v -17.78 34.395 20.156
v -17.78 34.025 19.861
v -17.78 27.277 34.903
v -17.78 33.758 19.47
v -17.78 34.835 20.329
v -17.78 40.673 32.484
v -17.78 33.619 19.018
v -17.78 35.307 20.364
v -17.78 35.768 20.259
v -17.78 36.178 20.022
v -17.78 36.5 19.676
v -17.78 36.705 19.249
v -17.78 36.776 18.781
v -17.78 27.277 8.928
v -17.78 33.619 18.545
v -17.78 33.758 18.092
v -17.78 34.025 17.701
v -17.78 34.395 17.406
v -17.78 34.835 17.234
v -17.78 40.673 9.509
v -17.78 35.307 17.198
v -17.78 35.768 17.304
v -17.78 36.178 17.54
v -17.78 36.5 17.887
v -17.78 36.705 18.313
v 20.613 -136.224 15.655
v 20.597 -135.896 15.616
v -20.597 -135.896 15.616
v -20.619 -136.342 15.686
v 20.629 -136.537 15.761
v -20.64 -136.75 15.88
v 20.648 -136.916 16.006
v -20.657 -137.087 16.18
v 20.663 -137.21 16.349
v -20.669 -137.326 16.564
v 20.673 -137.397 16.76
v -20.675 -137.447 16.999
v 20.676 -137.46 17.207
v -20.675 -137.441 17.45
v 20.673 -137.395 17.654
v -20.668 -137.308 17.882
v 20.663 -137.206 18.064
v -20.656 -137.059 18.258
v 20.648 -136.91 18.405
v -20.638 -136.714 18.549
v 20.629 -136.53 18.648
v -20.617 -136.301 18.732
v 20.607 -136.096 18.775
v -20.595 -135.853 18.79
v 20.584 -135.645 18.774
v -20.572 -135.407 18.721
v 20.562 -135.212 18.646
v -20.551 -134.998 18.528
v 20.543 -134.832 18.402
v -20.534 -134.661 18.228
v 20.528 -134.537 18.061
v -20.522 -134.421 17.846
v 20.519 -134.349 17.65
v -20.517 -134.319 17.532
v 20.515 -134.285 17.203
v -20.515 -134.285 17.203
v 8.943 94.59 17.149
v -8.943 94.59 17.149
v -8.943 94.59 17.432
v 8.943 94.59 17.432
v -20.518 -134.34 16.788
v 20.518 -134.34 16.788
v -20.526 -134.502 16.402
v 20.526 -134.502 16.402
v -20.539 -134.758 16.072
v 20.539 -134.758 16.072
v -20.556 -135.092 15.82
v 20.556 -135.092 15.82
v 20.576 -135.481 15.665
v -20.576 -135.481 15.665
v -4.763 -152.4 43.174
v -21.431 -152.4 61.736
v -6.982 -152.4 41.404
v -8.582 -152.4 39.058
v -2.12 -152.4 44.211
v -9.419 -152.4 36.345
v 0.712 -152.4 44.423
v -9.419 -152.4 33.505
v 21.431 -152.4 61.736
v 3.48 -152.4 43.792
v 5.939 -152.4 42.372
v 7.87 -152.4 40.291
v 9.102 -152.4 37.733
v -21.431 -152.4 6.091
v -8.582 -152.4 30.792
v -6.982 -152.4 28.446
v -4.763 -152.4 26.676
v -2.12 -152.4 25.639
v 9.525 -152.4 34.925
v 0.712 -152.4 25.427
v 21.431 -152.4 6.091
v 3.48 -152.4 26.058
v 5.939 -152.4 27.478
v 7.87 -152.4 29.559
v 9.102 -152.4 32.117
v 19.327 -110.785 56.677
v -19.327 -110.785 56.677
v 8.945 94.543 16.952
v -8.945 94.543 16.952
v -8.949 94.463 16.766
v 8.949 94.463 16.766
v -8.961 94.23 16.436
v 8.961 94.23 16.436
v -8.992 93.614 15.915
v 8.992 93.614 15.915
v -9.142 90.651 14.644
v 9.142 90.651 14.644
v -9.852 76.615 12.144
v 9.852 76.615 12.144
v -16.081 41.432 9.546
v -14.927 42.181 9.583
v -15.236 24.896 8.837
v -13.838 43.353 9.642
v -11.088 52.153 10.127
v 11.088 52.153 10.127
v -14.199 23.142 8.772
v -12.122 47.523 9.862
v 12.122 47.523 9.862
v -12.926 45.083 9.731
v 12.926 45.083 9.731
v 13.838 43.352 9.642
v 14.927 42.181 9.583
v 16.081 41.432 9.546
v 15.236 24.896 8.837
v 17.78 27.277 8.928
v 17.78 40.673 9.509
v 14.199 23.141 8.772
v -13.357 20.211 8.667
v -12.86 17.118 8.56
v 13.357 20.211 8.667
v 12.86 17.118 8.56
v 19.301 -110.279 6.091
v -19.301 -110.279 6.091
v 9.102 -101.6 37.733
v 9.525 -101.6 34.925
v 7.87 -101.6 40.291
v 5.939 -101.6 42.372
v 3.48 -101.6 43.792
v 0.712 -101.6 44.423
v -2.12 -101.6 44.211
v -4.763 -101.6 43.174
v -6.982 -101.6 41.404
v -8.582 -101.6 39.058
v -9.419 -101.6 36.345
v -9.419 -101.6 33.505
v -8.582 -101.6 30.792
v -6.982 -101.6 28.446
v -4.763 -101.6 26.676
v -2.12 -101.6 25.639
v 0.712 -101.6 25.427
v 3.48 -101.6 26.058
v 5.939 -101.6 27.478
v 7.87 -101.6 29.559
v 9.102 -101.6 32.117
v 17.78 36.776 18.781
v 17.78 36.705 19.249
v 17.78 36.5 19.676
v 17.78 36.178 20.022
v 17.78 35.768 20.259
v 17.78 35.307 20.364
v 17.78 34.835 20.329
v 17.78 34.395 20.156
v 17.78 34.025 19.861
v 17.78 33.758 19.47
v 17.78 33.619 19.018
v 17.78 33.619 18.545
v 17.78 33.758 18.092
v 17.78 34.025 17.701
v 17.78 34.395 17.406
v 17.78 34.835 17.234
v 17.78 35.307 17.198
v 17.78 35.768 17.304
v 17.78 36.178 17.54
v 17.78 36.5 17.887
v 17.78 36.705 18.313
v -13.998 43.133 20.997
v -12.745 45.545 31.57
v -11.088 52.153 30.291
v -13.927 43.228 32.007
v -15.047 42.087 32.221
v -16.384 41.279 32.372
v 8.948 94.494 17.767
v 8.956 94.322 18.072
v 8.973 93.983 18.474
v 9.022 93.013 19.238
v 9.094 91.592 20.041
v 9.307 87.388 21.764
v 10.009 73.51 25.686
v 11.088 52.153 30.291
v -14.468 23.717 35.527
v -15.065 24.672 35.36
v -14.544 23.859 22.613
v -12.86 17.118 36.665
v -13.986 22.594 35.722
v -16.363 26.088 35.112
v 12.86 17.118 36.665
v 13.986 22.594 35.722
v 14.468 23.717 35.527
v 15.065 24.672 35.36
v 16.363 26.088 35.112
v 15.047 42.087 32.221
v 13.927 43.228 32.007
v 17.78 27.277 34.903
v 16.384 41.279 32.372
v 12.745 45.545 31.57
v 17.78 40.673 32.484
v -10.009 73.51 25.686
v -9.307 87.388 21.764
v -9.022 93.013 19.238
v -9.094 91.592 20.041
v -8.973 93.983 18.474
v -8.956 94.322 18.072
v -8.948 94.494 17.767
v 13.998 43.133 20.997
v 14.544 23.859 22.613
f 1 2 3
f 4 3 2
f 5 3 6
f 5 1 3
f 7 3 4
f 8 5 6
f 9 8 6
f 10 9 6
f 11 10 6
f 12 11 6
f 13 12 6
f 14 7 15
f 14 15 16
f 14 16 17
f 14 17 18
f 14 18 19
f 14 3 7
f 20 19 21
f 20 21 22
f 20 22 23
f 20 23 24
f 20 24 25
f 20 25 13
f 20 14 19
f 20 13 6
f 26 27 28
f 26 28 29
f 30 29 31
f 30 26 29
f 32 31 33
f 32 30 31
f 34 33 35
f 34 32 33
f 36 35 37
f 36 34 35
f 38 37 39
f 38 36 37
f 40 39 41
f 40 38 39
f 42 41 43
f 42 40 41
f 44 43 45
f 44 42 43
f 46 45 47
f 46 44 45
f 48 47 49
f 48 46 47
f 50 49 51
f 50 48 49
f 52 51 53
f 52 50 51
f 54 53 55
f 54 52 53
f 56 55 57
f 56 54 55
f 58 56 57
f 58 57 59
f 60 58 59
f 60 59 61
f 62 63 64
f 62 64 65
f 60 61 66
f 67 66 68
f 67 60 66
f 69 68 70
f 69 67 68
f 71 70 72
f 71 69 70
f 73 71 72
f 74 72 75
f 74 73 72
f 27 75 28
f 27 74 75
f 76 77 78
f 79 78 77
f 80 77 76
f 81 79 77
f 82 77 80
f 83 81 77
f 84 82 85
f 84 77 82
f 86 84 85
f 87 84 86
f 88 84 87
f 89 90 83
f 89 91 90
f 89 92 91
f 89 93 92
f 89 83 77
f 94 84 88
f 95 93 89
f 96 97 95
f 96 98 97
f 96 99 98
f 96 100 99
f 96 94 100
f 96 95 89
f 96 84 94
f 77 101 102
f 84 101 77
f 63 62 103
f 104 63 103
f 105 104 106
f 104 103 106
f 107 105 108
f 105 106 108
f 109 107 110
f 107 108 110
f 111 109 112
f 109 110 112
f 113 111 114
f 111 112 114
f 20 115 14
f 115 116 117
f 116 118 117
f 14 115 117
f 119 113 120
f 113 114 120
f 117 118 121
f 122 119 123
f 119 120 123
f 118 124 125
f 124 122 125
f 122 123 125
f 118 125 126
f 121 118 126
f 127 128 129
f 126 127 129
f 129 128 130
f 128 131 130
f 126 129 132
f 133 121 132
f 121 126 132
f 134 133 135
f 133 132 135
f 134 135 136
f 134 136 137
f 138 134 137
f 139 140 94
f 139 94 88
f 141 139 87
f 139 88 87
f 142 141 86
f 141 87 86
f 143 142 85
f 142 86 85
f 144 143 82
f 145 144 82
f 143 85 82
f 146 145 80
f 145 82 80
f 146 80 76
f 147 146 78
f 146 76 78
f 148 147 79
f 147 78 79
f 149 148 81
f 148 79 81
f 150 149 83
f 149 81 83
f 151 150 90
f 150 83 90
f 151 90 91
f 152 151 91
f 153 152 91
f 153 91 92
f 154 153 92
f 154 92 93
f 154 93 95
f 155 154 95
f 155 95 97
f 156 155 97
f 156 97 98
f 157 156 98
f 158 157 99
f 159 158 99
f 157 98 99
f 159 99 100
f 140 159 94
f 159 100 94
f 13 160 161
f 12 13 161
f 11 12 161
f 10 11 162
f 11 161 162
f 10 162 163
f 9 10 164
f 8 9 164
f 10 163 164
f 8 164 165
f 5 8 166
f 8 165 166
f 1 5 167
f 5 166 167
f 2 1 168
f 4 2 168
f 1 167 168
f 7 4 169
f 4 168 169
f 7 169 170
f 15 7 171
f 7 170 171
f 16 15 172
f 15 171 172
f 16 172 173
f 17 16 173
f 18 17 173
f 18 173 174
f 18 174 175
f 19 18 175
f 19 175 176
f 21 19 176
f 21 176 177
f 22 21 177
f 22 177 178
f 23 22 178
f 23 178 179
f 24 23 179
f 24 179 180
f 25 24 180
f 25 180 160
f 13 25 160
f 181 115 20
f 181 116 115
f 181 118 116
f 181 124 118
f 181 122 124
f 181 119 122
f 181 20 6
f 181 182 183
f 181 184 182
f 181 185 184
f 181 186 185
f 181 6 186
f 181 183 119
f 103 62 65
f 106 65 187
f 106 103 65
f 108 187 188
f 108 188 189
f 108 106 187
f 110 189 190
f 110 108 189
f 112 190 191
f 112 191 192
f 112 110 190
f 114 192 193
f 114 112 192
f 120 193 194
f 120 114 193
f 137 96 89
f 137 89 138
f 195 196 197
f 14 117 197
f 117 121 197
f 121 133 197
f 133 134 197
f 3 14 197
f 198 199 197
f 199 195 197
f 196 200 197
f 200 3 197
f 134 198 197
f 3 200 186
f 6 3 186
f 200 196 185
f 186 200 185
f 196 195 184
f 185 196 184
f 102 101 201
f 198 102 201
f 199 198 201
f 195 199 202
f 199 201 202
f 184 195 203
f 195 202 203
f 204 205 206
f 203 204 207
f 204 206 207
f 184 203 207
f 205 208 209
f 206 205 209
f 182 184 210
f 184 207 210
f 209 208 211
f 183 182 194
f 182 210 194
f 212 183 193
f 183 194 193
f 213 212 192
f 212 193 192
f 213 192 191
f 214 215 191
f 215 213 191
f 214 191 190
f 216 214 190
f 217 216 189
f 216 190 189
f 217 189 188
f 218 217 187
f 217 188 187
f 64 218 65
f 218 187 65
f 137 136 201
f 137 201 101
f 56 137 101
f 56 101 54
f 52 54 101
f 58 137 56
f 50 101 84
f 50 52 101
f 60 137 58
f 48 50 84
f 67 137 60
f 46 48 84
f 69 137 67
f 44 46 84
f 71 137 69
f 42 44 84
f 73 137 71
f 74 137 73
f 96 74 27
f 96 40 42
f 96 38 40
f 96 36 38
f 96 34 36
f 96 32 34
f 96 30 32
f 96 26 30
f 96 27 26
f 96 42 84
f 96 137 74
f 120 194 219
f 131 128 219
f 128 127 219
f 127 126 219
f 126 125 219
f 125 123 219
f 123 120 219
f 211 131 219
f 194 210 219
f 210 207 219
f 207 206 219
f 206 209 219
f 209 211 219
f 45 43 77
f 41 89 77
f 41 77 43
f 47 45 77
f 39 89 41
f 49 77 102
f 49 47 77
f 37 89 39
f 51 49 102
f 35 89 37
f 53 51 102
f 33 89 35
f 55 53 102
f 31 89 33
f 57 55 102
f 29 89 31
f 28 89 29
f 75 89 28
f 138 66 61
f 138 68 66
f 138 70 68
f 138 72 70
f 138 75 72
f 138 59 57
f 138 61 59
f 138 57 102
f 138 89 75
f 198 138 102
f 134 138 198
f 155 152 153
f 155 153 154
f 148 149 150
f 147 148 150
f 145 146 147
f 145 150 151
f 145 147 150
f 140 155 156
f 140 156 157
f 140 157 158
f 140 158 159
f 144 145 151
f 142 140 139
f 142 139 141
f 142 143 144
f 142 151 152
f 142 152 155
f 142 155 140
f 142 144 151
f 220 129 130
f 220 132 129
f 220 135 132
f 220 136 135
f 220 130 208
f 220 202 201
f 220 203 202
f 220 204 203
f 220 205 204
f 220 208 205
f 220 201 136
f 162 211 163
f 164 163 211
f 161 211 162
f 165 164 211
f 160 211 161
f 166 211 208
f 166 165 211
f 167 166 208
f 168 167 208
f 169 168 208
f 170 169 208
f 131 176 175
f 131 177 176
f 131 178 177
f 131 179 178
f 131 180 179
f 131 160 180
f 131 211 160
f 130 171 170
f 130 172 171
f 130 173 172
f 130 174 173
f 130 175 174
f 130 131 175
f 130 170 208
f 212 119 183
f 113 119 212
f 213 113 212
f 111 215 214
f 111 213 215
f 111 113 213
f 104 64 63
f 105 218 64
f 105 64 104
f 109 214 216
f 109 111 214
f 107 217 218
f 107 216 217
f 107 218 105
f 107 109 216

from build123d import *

# Parameters (mm, degrees)
F1_DEPTH = 21.43125
F2_R     = 9.525
F3_DEPTH = 50.8
F4_R     = 1.5875
F6_DEPTH = 42.8635
F7_DEPTH = 61.7368760046


with BuildPart() as f1:
    # F0 (on Right) → F1 (new body, symmetric)
    with BuildSketch(Plane.YZ):
        Polygon((-152.4, 69.85), (-152.4, 0), (152.4, 0), (152.4, 19.05), align=None)
    extrude(amount=F1_DEPTH, both=True)

    # F2 (on face) → F3 (cut)
    with BuildSketch(Plane.XZ.offset(152.4)):
        with Locations((0, 34.925)):
            Circle(F2_R)
    extrude(amount=-F3_DEPTH, mode=Mode.SUBTRACT)

    # F4 (on face) → F6 (intersect, through all)
    with BuildSketch(Plane.YZ.offset(21.43125)):
        with BuildLine():
            add(Edge.make_bspline(
                [(-110.784560442, 56.6772185266), (-7.8078894531, 41.1616744021), (197.1659329213, 10.2781708389), (-8.1241632402, 7.4820430193), (-110.2786958218, 6.0906601138)],
                knots=[0, 0, 0, 0, 0.5023893773, 1, 1, 1, 1], degree=3))
            Line((-110.784560442, 56.6772185266), (-152.4, 61.7358759046))
            Line((-152.4, 61.7358759046), (-152.4, 6.0906601138))
            Line((-152.4, 6.0906601138), (-135.8959368267, 6.0906601138))
            Line((-135.8959368267, 6.0906601138), (-110.2786958218, 6.0906601138))
        make_face()
        with BuildLine():
            ThreePointArc((-134.2849996434, 17.202987096), (-134.7582847356, 16.0721991454), (-135.8959368267, 15.6156601138))
            ThreePointArc((-135.8959368267, 15.6156601138), (-136.9867145512, 18.3337750467), (-134.2849996434, 17.202987096))
        make_face(mode=Mode.SUBTRACT)
        with Locations((35.1882949471, 18.7812717256)):
            Circle(F4_R, mode=Mode.SUBTRACT)
    extrude(amount=-F6_DEPTH, mode=Mode.INTERSECT)

    # F5 (on face) → F7 (intersect, through all)
    with BuildSketch(Plane(origin=(0, 0, 0), x_dir=(1, 0, 0), z_dir=(0, 0, -1))):
        with BuildLine():
            Line((21.43125, 152.4), (-21.43125, 152.4))
            Line((-21.43125, 152.4), (-12.8599264801, -17.1176383792))
            add(Edge.make_bspline(
                [(-17.78, -27.2766537964), (-16.5623446124, -26.2978531998), (-13.865051172, -24.1296597555), (-13.2159822939, -19.6015799215), (-12.8599264801, -17.1176383792)],
                knots=[0, 0, 0, 0, 0.4514360097, 1, 1, 1, 1], degree=3))
            Line((-17.78, -27.2766537964), (-17.78, -40.6726039946))
            add(Edge.make_bspline(
                [(-17.78, -40.6726039946), (-16.3984452114, -41.2366877132), (-13.0146417293, -42.6182821799), (-11.8044986652, -48.6084287427), (-11.0884383555, -52.1528908229)],
                knots=[0, 0, 0, 0, 0.4082845815, 1, 1, 1, 1], degree=3))
            Line((-11.0884383555, -52.1528908229), (-8.9427102357, -94.5896))
            Line((-8.9427102357, -94.5896), (8.9427102357, -94.5896))
            Line((8.9427102357, -94.5896), (11.0884383555, -52.1528908229))
            add(Edge.make_bspline(
                [(17.78, -40.6726039946), (16.3984452114, -41.2366877132), (13.0146417293, -42.6182821799), (11.8044986652, -48.6084287427), (11.0884383555, -52.1528908229)],
                knots=[0, 0, 0, 0, 0.4082845815, 1, 1, 1, 1], degree=3))
            Line((17.78, -40.6726039946), (17.78, -27.2766537964))
            add(Edge.make_bspline(
                [(17.78, -27.2766537964), (16.5623446124, -26.2978531998), (13.865051172, -24.1296597555), (13.2159822939, -19.6015799215), (12.8599264801, -17.1176383792)],
                knots=[0, 0, 0, 0, 0.4514360097, 1, 1, 1, 1], degree=3))
            Line((12.8599264801, -17.1176383792), (21.43125, 152.4))
        make_face()
    extrude(amount=-F7_DEPTH, mode=Mode.INTERSECT)


solid = f1.part
